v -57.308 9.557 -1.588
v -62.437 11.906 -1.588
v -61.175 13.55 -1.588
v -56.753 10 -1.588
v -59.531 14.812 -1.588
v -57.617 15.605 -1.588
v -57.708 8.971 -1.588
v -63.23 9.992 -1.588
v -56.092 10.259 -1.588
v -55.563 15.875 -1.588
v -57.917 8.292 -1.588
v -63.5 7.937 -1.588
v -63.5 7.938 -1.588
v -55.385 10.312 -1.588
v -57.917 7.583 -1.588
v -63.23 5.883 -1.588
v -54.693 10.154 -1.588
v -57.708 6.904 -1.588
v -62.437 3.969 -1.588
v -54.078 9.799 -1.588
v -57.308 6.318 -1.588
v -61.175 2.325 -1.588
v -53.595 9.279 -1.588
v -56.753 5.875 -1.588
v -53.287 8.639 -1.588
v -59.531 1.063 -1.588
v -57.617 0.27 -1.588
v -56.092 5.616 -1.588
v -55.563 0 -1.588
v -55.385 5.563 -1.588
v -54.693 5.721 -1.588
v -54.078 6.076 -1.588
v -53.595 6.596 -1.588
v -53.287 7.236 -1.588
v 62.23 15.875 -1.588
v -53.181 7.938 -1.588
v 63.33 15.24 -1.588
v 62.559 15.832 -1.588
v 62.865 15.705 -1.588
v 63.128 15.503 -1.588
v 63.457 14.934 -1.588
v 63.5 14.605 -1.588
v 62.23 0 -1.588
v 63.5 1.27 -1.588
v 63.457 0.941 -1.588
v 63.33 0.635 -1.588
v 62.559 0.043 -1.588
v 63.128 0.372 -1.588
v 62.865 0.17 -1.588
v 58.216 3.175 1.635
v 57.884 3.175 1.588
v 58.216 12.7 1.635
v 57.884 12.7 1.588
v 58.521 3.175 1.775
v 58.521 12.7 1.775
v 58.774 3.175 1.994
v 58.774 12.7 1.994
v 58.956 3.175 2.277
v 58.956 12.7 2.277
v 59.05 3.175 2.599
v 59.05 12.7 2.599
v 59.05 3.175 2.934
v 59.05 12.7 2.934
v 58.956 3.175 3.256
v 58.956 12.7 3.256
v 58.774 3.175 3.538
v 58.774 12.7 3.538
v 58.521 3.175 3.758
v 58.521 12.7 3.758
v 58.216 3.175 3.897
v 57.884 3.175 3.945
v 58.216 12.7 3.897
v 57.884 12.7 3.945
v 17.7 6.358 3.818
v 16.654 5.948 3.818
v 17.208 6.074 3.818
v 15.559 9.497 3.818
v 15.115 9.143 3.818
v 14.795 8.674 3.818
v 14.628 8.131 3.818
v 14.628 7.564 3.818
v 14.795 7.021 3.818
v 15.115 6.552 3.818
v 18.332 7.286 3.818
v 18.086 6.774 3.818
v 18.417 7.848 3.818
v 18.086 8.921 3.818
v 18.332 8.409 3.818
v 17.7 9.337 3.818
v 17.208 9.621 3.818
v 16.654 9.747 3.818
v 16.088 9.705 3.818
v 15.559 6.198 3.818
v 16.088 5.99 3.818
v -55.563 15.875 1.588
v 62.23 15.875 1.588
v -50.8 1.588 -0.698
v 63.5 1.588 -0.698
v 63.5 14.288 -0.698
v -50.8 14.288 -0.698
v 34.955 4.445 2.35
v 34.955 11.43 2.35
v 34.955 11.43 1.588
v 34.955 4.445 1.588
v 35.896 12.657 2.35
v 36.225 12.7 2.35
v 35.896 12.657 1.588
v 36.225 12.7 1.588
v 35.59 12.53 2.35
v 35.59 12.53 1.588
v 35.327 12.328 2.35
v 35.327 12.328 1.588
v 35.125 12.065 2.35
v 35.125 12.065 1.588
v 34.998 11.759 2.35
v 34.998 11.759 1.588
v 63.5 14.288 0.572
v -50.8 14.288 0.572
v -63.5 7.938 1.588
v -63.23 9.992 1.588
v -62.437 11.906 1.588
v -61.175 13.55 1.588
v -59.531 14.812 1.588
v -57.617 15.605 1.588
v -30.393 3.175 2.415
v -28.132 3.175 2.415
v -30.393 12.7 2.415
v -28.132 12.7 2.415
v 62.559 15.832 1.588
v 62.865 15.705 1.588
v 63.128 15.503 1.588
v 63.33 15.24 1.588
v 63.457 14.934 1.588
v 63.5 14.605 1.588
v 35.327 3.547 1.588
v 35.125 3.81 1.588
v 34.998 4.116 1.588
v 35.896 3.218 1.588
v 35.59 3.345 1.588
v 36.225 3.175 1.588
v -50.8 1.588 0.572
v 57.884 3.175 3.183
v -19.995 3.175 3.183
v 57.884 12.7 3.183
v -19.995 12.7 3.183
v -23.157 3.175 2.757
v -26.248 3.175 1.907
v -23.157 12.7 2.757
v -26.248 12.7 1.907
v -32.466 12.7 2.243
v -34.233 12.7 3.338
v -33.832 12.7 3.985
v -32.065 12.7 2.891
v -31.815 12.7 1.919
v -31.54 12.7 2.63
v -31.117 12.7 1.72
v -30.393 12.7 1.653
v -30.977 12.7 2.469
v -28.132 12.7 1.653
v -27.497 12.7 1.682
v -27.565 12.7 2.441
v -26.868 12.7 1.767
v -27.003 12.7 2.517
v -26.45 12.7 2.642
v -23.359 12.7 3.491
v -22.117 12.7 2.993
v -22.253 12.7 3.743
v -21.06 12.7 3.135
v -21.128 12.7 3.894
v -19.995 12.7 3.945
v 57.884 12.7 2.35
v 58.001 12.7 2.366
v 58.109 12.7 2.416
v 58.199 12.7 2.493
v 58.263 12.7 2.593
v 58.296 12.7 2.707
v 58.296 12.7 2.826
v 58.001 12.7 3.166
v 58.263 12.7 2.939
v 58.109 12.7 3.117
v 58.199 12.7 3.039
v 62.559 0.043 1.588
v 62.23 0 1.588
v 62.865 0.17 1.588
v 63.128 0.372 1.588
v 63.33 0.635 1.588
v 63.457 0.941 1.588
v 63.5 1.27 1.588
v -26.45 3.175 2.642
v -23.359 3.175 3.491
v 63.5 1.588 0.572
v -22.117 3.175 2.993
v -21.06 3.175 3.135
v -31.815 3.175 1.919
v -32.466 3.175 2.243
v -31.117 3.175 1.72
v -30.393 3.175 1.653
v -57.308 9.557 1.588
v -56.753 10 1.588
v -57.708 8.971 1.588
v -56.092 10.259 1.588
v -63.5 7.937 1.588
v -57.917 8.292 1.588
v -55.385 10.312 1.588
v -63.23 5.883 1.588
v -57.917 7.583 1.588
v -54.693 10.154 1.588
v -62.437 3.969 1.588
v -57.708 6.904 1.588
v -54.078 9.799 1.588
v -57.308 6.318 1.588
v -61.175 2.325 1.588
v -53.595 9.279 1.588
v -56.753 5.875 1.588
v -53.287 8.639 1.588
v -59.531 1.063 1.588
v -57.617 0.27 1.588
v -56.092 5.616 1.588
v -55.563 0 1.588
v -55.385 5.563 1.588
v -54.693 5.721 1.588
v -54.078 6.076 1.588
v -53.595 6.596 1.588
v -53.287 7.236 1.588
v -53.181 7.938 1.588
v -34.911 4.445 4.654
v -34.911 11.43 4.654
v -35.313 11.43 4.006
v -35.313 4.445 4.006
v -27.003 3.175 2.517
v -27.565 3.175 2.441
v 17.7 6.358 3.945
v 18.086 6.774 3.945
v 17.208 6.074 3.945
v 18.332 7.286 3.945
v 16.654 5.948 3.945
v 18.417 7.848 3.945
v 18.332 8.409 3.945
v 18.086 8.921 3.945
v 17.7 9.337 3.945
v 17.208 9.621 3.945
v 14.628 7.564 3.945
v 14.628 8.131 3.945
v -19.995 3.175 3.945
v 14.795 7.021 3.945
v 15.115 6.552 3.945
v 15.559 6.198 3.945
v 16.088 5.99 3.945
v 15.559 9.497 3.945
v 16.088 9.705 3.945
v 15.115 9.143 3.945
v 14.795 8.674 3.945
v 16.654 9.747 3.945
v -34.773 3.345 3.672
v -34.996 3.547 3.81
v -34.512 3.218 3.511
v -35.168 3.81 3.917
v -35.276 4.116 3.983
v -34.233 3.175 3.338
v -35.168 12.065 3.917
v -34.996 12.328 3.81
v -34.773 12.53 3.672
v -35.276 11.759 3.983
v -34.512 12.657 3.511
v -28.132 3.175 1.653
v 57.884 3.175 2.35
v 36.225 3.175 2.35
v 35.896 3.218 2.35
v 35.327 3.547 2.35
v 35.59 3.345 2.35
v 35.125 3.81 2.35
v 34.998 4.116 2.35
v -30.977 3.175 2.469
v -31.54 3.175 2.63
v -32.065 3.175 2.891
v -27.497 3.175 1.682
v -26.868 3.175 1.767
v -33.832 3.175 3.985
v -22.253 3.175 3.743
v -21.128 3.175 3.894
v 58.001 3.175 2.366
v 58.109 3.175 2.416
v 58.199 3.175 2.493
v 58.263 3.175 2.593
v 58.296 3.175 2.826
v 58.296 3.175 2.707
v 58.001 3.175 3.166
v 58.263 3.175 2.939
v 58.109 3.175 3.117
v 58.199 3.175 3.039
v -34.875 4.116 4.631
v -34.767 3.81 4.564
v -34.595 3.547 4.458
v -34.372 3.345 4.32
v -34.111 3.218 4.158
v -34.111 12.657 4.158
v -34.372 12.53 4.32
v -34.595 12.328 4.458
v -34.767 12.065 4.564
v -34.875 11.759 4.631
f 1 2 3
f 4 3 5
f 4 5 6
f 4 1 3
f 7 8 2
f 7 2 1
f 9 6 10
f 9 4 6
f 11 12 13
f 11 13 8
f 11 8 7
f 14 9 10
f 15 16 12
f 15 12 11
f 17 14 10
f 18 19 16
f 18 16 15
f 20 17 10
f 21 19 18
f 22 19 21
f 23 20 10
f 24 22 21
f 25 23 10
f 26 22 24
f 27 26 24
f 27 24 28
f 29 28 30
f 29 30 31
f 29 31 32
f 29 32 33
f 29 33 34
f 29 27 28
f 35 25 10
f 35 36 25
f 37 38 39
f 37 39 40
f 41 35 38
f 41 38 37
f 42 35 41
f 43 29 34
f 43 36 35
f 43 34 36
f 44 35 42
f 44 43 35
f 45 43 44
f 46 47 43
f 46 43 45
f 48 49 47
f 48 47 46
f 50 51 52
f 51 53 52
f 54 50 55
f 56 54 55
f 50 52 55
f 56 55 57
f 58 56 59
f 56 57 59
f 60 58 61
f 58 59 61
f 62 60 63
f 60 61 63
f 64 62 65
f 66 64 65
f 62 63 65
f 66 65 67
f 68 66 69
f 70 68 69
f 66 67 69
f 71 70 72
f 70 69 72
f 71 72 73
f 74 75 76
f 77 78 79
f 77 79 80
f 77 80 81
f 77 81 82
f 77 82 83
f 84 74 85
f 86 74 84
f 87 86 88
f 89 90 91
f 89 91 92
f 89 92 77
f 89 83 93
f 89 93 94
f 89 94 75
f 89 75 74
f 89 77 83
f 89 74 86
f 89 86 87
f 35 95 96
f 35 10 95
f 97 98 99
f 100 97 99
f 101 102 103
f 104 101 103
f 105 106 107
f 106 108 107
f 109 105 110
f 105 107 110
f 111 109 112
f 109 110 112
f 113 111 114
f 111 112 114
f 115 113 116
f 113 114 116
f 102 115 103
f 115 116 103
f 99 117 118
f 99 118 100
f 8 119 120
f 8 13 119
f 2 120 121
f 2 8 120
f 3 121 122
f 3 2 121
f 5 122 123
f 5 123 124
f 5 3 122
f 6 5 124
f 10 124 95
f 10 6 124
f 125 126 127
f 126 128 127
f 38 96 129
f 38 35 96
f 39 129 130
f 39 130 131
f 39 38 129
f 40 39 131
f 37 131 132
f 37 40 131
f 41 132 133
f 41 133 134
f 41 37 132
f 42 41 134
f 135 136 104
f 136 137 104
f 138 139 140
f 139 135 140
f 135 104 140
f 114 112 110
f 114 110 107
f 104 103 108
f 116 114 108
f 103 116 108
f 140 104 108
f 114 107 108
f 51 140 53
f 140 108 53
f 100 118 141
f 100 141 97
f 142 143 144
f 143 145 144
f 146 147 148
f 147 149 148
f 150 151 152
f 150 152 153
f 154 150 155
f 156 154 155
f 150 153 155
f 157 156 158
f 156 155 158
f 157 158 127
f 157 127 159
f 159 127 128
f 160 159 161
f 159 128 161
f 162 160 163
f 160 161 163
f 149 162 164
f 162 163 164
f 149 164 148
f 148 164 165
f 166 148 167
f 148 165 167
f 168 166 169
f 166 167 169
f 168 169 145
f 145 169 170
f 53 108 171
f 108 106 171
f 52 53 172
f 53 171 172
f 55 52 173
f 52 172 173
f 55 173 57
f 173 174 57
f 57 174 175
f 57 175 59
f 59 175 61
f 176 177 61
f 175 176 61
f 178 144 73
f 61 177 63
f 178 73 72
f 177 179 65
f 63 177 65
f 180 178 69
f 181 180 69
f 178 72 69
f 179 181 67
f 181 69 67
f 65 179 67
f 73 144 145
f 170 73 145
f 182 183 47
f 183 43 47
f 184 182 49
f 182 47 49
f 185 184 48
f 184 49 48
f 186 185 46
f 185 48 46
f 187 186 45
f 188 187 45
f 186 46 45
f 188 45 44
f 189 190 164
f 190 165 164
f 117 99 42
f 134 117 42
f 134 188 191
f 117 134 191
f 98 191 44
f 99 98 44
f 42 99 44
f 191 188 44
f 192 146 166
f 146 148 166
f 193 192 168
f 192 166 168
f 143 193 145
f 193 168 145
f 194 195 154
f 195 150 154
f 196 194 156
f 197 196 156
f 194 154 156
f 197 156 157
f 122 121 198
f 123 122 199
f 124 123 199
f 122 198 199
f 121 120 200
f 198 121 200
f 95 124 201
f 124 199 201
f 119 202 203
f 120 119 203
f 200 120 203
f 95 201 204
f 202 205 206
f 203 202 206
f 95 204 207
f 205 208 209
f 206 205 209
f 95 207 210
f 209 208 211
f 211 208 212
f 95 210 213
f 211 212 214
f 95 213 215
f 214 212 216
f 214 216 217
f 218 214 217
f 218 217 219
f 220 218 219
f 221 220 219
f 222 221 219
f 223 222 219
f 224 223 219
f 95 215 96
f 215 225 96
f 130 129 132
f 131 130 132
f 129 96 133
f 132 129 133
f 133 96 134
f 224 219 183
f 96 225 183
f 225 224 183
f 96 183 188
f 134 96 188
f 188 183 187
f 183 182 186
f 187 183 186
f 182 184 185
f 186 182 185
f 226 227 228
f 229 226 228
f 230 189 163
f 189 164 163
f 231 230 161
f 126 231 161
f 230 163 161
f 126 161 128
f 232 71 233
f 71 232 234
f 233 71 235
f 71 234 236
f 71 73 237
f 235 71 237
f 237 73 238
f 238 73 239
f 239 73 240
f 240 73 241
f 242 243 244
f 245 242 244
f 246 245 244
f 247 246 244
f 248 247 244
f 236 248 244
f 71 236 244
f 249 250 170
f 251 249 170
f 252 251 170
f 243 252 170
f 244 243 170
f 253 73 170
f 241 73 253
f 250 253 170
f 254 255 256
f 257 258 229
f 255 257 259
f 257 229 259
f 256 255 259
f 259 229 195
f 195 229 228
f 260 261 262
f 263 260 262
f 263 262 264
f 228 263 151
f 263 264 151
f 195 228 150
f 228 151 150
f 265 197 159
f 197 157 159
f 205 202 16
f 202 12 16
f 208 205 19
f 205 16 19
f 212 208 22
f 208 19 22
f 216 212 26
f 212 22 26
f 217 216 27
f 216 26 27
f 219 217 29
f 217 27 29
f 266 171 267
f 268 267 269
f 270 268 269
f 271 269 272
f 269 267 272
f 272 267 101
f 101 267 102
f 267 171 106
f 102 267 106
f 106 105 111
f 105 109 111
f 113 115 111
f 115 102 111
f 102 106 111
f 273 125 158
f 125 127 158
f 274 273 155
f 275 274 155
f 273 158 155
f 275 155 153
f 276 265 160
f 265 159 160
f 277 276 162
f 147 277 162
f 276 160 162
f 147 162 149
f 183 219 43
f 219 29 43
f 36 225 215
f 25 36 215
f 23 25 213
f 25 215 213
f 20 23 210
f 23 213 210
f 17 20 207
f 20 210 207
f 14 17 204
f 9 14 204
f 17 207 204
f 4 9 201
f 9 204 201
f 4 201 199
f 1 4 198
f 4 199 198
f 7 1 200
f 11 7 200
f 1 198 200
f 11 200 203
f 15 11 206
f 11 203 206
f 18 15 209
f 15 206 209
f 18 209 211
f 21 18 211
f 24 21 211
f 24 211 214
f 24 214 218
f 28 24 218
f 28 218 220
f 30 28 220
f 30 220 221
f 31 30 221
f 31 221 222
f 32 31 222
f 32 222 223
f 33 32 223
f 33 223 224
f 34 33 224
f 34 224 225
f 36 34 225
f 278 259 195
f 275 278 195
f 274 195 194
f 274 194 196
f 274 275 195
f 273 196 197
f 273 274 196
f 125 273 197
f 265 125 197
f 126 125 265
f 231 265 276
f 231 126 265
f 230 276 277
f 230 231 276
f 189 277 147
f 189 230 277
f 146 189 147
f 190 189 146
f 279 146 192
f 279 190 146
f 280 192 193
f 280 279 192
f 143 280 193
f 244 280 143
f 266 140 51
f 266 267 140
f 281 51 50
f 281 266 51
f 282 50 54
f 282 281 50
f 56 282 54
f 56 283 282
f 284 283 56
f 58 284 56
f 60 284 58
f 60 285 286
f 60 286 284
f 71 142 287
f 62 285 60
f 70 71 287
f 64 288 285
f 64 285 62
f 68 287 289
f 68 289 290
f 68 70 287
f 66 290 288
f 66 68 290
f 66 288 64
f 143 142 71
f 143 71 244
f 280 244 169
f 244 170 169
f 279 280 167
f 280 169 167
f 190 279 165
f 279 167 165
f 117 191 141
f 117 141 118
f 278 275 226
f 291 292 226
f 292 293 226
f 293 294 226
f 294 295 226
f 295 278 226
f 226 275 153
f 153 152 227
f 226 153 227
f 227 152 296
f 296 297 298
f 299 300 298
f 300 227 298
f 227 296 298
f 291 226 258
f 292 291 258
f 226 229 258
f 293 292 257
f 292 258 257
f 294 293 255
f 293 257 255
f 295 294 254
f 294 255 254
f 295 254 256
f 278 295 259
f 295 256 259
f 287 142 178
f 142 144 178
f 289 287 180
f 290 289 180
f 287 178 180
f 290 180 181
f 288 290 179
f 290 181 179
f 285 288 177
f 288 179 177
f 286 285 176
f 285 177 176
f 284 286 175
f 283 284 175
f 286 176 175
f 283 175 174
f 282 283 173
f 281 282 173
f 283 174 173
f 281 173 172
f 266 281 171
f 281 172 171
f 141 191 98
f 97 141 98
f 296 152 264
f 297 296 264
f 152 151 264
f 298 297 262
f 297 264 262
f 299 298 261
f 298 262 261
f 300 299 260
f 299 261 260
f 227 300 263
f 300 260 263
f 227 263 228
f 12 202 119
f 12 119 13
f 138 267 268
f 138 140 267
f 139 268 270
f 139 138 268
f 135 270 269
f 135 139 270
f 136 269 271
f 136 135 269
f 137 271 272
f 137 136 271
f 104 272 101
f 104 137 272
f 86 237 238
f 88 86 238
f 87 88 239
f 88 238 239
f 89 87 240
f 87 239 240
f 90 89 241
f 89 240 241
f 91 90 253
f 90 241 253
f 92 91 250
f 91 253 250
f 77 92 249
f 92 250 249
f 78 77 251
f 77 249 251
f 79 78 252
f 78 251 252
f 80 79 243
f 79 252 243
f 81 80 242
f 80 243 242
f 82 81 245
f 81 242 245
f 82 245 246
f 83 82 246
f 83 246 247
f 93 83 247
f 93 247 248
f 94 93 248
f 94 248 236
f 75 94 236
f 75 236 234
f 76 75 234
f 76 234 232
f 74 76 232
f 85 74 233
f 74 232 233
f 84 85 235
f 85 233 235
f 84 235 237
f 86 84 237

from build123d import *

# Parameters (mm, degrees)
SKETCH1_W           = 127
SKETCH1_H           = 3.175
BASE_EXTRUDE_DEPTH  = 15.875
FILLET1_R           = 7.9375
SKETCH2_R           = 2.38125
CUT_EXTRUDE1_DEPTH  = 66.531261624
SKETCH4_W           = 1.27
SKETCH4_H           = 12.7
CUT_EXTRUDE2_DEPTH  = 114.3
BOSS_EXTRUDE1_DEPTH = 4.7625
FILLET2_R           = 1.27
FILLET3_R           = 1.27
SKETCH8_R           = 1.905
CUT_EXTRUDE3_DEPTH  = 0.127


with BuildPart() as part:
    # Sketch1 → Base-Extrude (new body)
    with BuildSketch(Plane(origin=(0, 0, 0), x_dir=(1, 0, 0), z_dir=(0, 1, 0))):
        Rectangle(SKETCH1_W, SKETCH1_H)
    extrude(amount=BASE_EXTRUDE_DEPTH)

    # Fillet1
    fillet1_edges = [part.edges().sort_by_distance(p)[0] for p in [
        (-63.5, 15.875, 0),
        (-63.5, 0, 0),
    ]]
    fillet(fillet1_edges, radius=FILLET1_R - 0.0001)  # a hair under: the kernel refuses the full size

    # Sketch2 → Cut-Extrude1 (cut, through all)
    with BuildSketch(Plane.XY.offset(1.5875)):
        with Locations((-55.5625, 7.9375)):
            Circle(SKETCH2_R)
    extrude(amount=-CUT_EXTRUDE1_DEPTH, mode=Mode.SUBTRACT)

    # Sketch4 → Cut-Extrude2 (cut)
    with BuildSketch(Plane(origin=(63.5, 0, 0), x_dir=(0, 0, -1), z_dir=(1, 0, 0))):
        with Locations((0.0635, 7.9375)):
            Rectangle(SKETCH4_W, SKETCH4_H)
    extrude(amount=-CUT_EXTRUDE2_DEPTH, mode=Mode.SUBTRACT)

    # Fillet2
    fillet2_edges = [part.edges().sort_by_distance(p)[0] for p in [
        (63.5, 15.875, 0),
        (63.5, 0, 0),
    ]]
    fillet(fillet2_edges, radius=FILLET2_R)


with BuildPart() as body_2:
    # Sketch5 → Boss-Extrude1 (new, symmetric)
    with BuildSketch(Plane(origin=(0, 7.9375, 0), x_dir=(-1, 0, 0), z_dir=(0, 1, 0))):
        with BuildLine():
            Line((-34.954800237, 1.5875), (-57.883560189, 1.5875))
            ThreePointArc((-57.883560189, 1.5875), (-59.062352087, 2.766291898), (-57.883560189, 3.945083796))
            Line((-57.883560189, 3.945083796), (19.994775417, 3.945083796))
            ThreePointArc((19.994775417, 3.945083796), (21.6920601, 3.831156444), (23.358893265, 3.491418395))
            Line((23.358893265, 3.491418395), (26.450077985, 2.642257398))
            ThreePointArc((26.450077985, 2.642257398), (27.283494567, 2.472388373), (28.132136909, 2.415424698))
            Line((28.132136909, 2.415424698), (30.393068236, 2.415424698))
            ThreePointArc((30.393068236, 2.415424698), (31.262035394, 2.536653082), (32.064644452, 2.891080712))
            Line((32.064644452, 2.891080712), (34.911465551, 4.653982537))
            Line((34.911465551, 4.653982537), (35.312643843, 4.006139981))
            Line((35.312643843, 4.006139981), (32.465822744, 2.243238155))
            ThreePointArc((32.465822744, 2.243238155), (31.470587512, 1.803747895), (30.393068236, 1.653424698))
            Line((30.393068236, 1.653424698), (28.132136909, 1.653424698))
            ThreePointArc((28.132136909, 1.653424698), (27.181657486, 1.717224015), (26.248230914, 1.907477322))
            Line((26.248230914, 1.907477322), (23.157046194, 2.756638319))
            ThreePointArc((23.157046194, 2.756638319), (21.590223019, 3.075992085), (19.994775417, 3.183083796))
            Line((19.994775417, 3.183083796), (-57.883560189, 3.183083796))
            ThreePointArc((-57.883560189, 3.183083796), (-58.300352087, 2.766291898), (-57.883560189, 2.3495))
            Line((-57.883560189, 2.3495), (-34.954800237, 2.3495))
            Line((-34.954800237, 2.3495), (-34.954800237, 1.5875))
        make_face()
    extrude(amount=BOSS_EXTRUDE1_DEPTH, both=True)

    # Fillet3
    fillet3_edges = [body_2.edges().sort_by_distance(p)[0] for p in [
        (-35.112054697, 3.175, 4.330061259),
        (34.954800237, 3.175, 1.9685),
        (-35.112054697, 12.7, 4.330061259),
        (34.954800237, 12.7, 1.9685),
    ]]
    fillet(fillet3_edges, radius=FILLET3_R)

    # Sketch8 → Cut-Extrude3 (cut)
    with BuildSketch(Plane.XY.offset(3.945083796)):
        with Locations((16.511768765, 7.847518323)):
            Circle(SKETCH8_R)
    extrude(amount=-CUT_EXTRUDE3_DEPTH, mode=Mode.SUBTRACT)


solid = Compound([part.part, body_2.part])
